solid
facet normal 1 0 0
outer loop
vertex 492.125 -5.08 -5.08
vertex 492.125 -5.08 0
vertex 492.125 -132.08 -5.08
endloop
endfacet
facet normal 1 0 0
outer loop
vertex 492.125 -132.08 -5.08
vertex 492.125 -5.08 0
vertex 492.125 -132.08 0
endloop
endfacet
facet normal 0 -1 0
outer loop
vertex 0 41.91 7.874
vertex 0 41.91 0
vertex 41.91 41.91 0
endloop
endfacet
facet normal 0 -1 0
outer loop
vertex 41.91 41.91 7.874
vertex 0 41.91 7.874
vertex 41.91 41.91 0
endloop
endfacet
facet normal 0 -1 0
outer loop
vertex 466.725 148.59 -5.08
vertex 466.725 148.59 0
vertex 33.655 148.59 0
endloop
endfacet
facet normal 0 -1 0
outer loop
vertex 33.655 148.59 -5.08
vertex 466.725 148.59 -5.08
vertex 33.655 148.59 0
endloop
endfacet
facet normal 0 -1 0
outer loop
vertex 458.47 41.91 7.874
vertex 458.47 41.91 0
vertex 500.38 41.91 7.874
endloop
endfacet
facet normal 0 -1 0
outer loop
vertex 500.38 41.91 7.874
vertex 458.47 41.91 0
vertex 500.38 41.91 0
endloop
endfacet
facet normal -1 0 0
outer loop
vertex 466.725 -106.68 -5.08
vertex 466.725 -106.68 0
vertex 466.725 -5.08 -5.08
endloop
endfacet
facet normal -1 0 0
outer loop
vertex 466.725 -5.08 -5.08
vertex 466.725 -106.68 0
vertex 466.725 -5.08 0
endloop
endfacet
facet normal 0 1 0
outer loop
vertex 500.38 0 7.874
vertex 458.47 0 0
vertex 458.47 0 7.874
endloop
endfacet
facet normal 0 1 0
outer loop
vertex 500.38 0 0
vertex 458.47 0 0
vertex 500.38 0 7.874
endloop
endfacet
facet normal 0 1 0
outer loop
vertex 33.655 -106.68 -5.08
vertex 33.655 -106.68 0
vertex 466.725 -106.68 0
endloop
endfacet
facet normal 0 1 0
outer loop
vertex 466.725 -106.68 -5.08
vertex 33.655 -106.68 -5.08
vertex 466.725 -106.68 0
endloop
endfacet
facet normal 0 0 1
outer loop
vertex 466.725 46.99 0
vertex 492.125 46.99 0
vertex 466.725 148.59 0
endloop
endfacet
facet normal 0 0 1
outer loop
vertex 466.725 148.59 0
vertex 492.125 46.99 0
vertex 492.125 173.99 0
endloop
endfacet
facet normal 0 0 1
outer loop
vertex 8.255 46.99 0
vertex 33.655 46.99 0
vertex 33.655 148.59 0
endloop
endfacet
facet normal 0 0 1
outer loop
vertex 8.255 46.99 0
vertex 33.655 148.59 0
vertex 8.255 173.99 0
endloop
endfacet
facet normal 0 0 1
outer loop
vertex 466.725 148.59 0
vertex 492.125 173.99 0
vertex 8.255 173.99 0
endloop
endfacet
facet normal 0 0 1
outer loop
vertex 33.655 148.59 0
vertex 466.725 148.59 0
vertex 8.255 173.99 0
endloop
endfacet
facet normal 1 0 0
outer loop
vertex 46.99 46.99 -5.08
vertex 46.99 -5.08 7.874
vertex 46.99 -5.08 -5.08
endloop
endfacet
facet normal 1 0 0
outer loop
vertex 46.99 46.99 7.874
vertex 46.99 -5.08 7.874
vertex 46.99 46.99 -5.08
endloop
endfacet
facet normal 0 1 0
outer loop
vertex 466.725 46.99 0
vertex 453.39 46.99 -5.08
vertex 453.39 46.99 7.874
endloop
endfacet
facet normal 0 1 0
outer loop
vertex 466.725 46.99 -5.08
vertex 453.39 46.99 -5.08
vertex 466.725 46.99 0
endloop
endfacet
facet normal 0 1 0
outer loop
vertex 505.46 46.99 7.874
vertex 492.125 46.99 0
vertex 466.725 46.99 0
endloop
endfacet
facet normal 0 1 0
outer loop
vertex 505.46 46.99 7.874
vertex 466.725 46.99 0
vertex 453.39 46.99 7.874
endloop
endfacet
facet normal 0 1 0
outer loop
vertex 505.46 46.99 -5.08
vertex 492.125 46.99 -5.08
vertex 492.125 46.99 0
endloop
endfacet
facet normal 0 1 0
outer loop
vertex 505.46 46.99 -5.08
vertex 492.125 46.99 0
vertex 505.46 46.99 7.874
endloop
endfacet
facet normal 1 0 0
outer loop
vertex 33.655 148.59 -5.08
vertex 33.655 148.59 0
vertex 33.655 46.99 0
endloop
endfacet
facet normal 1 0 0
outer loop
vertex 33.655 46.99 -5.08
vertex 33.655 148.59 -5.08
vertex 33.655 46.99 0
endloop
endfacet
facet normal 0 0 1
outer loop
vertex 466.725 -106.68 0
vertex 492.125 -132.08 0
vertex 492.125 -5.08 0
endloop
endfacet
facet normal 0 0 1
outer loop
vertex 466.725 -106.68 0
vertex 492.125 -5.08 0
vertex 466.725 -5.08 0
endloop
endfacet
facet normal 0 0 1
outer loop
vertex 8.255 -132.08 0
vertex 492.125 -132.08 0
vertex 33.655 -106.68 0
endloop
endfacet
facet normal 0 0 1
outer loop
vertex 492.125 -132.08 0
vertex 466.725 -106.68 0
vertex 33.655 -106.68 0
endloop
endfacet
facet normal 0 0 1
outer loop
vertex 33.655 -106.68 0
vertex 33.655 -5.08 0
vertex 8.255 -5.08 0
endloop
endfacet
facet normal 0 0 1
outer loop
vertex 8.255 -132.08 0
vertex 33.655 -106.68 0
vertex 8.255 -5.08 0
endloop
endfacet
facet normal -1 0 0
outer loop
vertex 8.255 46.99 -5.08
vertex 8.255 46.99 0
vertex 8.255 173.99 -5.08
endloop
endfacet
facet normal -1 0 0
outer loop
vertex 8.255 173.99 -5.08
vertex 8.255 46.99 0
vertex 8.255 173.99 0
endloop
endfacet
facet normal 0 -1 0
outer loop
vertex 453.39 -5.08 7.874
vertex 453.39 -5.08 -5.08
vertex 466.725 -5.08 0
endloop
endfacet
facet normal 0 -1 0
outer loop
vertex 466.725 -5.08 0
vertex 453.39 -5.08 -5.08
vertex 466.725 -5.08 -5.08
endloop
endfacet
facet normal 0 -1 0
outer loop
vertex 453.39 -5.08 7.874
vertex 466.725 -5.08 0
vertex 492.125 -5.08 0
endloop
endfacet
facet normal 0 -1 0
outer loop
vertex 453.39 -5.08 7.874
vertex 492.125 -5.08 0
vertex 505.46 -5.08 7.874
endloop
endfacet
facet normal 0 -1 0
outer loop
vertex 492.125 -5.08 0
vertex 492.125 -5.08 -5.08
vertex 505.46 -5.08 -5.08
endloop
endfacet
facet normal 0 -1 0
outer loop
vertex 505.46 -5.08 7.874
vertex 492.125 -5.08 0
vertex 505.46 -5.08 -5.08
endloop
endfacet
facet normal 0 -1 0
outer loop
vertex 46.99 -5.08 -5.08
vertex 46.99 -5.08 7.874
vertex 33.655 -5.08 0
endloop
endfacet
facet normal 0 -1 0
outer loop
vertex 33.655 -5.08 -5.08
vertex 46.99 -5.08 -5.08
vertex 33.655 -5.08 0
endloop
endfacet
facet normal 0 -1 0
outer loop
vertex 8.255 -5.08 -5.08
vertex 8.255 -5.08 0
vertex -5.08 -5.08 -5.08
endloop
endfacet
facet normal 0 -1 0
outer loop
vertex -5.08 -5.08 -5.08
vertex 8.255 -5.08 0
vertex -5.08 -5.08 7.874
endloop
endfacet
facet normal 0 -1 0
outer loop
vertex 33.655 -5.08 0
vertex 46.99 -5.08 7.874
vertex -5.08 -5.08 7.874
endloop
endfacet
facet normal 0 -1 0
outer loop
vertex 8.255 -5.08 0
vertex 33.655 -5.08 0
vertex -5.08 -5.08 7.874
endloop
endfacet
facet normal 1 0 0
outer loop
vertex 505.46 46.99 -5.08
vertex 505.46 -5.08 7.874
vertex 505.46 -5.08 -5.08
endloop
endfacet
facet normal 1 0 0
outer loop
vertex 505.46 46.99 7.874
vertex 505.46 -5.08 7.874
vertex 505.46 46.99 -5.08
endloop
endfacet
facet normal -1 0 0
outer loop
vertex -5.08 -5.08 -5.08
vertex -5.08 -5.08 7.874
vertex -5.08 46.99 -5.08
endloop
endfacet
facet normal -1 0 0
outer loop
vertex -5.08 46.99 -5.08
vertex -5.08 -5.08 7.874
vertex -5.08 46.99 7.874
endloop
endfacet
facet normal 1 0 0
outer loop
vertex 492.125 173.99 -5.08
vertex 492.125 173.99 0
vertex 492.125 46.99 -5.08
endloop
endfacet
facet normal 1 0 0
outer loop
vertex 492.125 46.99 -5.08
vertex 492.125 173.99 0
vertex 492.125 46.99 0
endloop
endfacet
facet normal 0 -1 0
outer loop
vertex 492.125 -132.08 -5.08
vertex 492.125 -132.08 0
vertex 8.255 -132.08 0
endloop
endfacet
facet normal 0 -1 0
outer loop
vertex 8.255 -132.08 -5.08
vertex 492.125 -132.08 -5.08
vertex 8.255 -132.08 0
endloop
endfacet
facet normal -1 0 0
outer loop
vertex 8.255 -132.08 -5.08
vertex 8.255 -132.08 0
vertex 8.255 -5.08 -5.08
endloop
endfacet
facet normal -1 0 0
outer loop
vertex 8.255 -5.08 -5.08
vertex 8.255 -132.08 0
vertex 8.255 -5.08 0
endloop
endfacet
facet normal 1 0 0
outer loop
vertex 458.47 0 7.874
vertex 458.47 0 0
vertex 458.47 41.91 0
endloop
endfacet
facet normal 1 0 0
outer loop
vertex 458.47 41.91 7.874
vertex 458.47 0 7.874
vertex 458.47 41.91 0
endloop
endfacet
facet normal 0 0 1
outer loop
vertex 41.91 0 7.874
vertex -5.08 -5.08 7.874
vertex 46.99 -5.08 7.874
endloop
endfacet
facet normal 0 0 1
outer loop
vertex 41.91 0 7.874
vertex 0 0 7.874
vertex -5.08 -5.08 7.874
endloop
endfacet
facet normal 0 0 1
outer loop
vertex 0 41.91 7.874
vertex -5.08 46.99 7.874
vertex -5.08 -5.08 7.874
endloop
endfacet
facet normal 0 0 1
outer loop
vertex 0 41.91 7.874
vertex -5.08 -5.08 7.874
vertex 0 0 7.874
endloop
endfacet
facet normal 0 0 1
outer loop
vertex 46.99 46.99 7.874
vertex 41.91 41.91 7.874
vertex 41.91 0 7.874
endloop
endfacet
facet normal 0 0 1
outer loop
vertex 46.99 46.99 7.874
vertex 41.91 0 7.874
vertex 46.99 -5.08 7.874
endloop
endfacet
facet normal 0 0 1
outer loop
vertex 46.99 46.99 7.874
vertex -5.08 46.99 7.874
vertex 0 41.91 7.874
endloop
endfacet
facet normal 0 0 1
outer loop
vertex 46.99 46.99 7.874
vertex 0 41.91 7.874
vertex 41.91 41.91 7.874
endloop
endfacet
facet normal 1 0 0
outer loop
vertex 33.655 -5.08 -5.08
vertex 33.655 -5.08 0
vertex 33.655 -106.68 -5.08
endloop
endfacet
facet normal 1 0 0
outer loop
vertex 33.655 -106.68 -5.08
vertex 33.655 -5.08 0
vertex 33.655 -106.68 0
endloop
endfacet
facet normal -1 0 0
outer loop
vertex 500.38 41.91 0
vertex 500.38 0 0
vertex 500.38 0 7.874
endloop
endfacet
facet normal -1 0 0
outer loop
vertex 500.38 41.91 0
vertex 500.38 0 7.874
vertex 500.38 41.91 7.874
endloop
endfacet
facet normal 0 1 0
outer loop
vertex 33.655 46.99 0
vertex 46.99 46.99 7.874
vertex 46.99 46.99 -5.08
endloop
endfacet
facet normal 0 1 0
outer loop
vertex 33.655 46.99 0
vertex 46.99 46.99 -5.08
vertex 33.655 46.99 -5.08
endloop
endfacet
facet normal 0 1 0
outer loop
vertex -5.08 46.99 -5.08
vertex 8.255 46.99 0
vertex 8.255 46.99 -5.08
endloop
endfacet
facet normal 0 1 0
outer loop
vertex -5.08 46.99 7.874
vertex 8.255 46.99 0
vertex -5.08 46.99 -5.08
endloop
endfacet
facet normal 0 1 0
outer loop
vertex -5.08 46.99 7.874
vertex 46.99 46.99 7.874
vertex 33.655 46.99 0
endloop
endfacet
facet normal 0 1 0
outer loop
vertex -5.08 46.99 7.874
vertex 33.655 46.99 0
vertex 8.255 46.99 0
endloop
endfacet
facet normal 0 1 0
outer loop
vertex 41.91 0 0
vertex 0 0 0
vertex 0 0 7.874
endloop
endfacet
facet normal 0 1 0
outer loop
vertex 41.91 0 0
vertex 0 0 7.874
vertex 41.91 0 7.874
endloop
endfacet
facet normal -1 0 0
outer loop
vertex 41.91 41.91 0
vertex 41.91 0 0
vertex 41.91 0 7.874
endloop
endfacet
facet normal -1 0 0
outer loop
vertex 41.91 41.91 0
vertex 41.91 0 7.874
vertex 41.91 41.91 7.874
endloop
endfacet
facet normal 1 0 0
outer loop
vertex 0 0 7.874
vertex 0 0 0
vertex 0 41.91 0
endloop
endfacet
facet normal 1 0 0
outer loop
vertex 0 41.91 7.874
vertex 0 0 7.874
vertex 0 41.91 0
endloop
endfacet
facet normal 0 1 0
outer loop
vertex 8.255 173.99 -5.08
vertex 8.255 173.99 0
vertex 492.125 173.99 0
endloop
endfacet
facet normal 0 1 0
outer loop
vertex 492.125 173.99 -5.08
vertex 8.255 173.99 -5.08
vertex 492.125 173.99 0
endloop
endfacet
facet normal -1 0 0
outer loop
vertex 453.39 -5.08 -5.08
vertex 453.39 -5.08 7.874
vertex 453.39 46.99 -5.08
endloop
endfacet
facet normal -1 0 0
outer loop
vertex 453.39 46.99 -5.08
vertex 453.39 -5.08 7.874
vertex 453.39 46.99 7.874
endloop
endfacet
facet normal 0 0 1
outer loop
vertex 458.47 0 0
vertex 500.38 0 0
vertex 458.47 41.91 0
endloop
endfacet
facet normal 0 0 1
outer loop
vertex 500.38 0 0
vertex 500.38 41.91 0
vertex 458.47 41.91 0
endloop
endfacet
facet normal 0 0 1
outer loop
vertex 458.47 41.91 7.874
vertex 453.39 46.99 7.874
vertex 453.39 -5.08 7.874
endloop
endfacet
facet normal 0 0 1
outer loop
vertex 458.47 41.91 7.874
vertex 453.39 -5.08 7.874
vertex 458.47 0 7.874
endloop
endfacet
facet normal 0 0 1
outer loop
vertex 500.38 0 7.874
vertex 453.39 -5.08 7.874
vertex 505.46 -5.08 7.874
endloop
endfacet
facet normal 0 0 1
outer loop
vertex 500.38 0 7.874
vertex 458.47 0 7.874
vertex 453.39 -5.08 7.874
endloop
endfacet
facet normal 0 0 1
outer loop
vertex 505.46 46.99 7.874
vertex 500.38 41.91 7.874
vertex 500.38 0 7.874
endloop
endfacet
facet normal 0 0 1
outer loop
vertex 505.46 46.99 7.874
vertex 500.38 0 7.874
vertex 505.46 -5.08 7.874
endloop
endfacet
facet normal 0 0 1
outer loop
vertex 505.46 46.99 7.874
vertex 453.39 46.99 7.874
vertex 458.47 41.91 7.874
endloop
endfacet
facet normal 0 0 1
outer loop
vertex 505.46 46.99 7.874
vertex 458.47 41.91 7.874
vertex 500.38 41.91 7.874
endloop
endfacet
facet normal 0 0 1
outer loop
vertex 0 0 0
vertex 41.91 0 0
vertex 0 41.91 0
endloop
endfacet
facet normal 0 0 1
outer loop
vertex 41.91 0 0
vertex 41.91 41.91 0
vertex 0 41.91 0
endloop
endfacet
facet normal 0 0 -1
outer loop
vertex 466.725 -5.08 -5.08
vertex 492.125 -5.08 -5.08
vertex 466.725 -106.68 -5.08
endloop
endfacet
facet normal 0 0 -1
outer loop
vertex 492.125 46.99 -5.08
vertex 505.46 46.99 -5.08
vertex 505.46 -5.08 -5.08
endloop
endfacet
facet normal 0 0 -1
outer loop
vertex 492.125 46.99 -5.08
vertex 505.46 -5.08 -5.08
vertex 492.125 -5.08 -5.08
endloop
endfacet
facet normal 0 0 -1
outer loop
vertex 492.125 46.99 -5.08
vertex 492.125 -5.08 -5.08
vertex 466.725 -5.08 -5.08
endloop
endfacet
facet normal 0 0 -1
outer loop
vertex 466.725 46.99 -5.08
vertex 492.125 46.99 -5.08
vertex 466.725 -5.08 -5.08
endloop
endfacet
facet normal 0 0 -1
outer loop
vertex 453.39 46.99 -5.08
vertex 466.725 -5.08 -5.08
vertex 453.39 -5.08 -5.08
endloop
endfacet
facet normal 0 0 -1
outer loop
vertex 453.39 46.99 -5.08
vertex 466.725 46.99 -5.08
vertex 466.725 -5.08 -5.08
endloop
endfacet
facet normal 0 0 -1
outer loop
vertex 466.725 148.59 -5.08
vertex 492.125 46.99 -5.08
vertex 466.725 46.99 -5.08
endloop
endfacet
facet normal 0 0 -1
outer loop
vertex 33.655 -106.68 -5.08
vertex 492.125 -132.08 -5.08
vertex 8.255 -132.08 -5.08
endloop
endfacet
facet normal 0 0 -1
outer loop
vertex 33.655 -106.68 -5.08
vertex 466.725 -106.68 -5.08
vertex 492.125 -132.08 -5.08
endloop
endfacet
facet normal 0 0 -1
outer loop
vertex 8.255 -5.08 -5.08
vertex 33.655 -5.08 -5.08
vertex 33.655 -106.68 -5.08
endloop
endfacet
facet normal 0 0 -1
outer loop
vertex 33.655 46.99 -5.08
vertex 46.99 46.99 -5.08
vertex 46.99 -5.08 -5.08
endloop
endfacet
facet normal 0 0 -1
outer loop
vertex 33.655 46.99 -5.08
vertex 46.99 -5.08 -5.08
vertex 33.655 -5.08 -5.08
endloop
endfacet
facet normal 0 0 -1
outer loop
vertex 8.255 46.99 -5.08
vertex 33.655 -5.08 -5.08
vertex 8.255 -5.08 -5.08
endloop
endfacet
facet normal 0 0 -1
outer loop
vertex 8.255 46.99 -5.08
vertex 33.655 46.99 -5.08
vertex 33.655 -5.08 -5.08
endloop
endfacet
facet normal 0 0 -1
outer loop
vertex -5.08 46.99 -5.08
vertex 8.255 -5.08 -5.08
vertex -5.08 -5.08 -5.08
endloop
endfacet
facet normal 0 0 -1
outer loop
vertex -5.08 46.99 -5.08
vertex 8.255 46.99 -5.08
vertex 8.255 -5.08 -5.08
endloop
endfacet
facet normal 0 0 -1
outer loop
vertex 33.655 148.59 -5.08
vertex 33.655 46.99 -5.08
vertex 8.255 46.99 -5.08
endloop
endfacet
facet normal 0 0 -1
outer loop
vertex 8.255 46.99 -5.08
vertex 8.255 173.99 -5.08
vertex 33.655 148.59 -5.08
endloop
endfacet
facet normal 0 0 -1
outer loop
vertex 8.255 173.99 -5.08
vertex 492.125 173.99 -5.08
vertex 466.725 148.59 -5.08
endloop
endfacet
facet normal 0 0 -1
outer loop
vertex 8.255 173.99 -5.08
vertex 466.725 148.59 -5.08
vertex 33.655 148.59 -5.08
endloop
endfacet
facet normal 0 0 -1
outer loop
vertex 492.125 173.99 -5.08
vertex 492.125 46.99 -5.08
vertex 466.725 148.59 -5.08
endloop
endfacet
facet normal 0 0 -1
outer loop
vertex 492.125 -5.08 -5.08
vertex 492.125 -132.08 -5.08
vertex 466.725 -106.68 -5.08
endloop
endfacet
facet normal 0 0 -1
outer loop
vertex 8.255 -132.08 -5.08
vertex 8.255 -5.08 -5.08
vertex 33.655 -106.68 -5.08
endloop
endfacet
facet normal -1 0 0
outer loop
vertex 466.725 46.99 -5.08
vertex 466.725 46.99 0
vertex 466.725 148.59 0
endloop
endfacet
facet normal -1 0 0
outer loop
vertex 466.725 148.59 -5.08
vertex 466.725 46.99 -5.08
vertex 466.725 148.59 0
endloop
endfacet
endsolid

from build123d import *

# Parameters (mm, degrees)
SKETCH1_W             = 52.07
SKETCH1_H             = 52.07
SKETCH1_W_2           = 41.91
SKETCH1_H_2           = 41.91
BOSS_EXTRUDE1_DEPTH   = 7.874
BOSS_EXTRUDE1_2_DEPTH = 7.874
BOSS_EXTRUDE3_DEPTH   = 5.08
BOSS_EXTRUDE3_2_DEPTH = 5.08
SKETCH3_W             = 52.07
SKETCH3_H             = 52.07
BOSS_EXTRUDE4_DEPTH   = 5.08


with BuildPart() as part:
    # Sketch1 → Boss-Extrude1 (new body)
    with BuildSketch(Plane.XY):
        with Locations((20.955, 20.955)):
            Rectangle(SKETCH1_W, SKETCH1_H)
        with Locations((20.955, 20.955)):
            Rectangle(SKETCH1_W_2, SKETCH1_H_2, mode=Mode.SUBTRACT)
    extrude(amount=BOSS_EXTRUDE1_DEPTH)



with BuildPart() as body_2:
    # Sketch1 → Boss-Extrude1 2 (new body)
    with BuildSketch(Plane.XY):
        with Locations((479.425, 20.955)):
            Rectangle(SKETCH1_W, SKETCH1_H)
        with Locations((479.425, 20.955)):
            Rectangle(SKETCH1_W_2, SKETCH1_H_2, mode=Mode.SUBTRACT)
    extrude(amount=BOSS_EXTRUDE1_2_DEPTH)


with BuildPart() as body_3:
    # Sketch2 → Boss-Extrude3 (new body)
    with BuildSketch(Plane(origin=(0, 0, 0), x_dir=(-1, 0, 0), z_dir=(0, 0, -1))):
        Polygon((-8.255, -132.08), (-8.255, -5.08), (-33.655, -5.08), (-33.655, -106.68), (-466.725, -106.68), (-466.725, -5.08), (-492.125, -5.08), (-492.125, -132.08), align=None)
    extrude(amount=BOSS_EXTRUDE3_DEPTH)


with BuildPart() as body_4:
    # Sketch2 → Boss-Extrude3 2 (new body)
    with BuildSketch(Plane(origin=(0, 0, 0), x_dir=(-1, 0, 0), z_dir=(0, 0, -1))):
        Polygon((-33.655, 46.99), (-8.255, 46.99), (-8.255, 173.99), (-492.125, 173.99), (-492.125, 46.99), (-466.725, 46.99), (-466.725, 148.59), (-33.655, 148.59), align=None)
    extrude(amount=BOSS_EXTRUDE3_2_DEPTH)


with BuildPart() as part_1:
    add(part.part)

    add(body_2.part)  # Boss-Extrude4 merges body 2

    add(body_3.part)  # Boss-Extrude4 merges body 3

    add(body_4.part)  # Boss-Extrude4 merges body 4
    # Sketch3 → Boss-Extrude4 (add)
    with BuildSketch(Plane(origin=(0, 0, 0), x_dir=(-1, 0, 0), z_dir=(0, 0, -1))):
        with Locations((-20.955, 20.955)):
            Rectangle(SKETCH3_W, SKETCH3_H)
        with Locations((-479.425, 20.955)):
            Rectangle(SKETCH3_W, SKETCH3_H)
    extrude(amount=BOSS_EXTRUDE4_DEPTH)


solid = part_1.part
